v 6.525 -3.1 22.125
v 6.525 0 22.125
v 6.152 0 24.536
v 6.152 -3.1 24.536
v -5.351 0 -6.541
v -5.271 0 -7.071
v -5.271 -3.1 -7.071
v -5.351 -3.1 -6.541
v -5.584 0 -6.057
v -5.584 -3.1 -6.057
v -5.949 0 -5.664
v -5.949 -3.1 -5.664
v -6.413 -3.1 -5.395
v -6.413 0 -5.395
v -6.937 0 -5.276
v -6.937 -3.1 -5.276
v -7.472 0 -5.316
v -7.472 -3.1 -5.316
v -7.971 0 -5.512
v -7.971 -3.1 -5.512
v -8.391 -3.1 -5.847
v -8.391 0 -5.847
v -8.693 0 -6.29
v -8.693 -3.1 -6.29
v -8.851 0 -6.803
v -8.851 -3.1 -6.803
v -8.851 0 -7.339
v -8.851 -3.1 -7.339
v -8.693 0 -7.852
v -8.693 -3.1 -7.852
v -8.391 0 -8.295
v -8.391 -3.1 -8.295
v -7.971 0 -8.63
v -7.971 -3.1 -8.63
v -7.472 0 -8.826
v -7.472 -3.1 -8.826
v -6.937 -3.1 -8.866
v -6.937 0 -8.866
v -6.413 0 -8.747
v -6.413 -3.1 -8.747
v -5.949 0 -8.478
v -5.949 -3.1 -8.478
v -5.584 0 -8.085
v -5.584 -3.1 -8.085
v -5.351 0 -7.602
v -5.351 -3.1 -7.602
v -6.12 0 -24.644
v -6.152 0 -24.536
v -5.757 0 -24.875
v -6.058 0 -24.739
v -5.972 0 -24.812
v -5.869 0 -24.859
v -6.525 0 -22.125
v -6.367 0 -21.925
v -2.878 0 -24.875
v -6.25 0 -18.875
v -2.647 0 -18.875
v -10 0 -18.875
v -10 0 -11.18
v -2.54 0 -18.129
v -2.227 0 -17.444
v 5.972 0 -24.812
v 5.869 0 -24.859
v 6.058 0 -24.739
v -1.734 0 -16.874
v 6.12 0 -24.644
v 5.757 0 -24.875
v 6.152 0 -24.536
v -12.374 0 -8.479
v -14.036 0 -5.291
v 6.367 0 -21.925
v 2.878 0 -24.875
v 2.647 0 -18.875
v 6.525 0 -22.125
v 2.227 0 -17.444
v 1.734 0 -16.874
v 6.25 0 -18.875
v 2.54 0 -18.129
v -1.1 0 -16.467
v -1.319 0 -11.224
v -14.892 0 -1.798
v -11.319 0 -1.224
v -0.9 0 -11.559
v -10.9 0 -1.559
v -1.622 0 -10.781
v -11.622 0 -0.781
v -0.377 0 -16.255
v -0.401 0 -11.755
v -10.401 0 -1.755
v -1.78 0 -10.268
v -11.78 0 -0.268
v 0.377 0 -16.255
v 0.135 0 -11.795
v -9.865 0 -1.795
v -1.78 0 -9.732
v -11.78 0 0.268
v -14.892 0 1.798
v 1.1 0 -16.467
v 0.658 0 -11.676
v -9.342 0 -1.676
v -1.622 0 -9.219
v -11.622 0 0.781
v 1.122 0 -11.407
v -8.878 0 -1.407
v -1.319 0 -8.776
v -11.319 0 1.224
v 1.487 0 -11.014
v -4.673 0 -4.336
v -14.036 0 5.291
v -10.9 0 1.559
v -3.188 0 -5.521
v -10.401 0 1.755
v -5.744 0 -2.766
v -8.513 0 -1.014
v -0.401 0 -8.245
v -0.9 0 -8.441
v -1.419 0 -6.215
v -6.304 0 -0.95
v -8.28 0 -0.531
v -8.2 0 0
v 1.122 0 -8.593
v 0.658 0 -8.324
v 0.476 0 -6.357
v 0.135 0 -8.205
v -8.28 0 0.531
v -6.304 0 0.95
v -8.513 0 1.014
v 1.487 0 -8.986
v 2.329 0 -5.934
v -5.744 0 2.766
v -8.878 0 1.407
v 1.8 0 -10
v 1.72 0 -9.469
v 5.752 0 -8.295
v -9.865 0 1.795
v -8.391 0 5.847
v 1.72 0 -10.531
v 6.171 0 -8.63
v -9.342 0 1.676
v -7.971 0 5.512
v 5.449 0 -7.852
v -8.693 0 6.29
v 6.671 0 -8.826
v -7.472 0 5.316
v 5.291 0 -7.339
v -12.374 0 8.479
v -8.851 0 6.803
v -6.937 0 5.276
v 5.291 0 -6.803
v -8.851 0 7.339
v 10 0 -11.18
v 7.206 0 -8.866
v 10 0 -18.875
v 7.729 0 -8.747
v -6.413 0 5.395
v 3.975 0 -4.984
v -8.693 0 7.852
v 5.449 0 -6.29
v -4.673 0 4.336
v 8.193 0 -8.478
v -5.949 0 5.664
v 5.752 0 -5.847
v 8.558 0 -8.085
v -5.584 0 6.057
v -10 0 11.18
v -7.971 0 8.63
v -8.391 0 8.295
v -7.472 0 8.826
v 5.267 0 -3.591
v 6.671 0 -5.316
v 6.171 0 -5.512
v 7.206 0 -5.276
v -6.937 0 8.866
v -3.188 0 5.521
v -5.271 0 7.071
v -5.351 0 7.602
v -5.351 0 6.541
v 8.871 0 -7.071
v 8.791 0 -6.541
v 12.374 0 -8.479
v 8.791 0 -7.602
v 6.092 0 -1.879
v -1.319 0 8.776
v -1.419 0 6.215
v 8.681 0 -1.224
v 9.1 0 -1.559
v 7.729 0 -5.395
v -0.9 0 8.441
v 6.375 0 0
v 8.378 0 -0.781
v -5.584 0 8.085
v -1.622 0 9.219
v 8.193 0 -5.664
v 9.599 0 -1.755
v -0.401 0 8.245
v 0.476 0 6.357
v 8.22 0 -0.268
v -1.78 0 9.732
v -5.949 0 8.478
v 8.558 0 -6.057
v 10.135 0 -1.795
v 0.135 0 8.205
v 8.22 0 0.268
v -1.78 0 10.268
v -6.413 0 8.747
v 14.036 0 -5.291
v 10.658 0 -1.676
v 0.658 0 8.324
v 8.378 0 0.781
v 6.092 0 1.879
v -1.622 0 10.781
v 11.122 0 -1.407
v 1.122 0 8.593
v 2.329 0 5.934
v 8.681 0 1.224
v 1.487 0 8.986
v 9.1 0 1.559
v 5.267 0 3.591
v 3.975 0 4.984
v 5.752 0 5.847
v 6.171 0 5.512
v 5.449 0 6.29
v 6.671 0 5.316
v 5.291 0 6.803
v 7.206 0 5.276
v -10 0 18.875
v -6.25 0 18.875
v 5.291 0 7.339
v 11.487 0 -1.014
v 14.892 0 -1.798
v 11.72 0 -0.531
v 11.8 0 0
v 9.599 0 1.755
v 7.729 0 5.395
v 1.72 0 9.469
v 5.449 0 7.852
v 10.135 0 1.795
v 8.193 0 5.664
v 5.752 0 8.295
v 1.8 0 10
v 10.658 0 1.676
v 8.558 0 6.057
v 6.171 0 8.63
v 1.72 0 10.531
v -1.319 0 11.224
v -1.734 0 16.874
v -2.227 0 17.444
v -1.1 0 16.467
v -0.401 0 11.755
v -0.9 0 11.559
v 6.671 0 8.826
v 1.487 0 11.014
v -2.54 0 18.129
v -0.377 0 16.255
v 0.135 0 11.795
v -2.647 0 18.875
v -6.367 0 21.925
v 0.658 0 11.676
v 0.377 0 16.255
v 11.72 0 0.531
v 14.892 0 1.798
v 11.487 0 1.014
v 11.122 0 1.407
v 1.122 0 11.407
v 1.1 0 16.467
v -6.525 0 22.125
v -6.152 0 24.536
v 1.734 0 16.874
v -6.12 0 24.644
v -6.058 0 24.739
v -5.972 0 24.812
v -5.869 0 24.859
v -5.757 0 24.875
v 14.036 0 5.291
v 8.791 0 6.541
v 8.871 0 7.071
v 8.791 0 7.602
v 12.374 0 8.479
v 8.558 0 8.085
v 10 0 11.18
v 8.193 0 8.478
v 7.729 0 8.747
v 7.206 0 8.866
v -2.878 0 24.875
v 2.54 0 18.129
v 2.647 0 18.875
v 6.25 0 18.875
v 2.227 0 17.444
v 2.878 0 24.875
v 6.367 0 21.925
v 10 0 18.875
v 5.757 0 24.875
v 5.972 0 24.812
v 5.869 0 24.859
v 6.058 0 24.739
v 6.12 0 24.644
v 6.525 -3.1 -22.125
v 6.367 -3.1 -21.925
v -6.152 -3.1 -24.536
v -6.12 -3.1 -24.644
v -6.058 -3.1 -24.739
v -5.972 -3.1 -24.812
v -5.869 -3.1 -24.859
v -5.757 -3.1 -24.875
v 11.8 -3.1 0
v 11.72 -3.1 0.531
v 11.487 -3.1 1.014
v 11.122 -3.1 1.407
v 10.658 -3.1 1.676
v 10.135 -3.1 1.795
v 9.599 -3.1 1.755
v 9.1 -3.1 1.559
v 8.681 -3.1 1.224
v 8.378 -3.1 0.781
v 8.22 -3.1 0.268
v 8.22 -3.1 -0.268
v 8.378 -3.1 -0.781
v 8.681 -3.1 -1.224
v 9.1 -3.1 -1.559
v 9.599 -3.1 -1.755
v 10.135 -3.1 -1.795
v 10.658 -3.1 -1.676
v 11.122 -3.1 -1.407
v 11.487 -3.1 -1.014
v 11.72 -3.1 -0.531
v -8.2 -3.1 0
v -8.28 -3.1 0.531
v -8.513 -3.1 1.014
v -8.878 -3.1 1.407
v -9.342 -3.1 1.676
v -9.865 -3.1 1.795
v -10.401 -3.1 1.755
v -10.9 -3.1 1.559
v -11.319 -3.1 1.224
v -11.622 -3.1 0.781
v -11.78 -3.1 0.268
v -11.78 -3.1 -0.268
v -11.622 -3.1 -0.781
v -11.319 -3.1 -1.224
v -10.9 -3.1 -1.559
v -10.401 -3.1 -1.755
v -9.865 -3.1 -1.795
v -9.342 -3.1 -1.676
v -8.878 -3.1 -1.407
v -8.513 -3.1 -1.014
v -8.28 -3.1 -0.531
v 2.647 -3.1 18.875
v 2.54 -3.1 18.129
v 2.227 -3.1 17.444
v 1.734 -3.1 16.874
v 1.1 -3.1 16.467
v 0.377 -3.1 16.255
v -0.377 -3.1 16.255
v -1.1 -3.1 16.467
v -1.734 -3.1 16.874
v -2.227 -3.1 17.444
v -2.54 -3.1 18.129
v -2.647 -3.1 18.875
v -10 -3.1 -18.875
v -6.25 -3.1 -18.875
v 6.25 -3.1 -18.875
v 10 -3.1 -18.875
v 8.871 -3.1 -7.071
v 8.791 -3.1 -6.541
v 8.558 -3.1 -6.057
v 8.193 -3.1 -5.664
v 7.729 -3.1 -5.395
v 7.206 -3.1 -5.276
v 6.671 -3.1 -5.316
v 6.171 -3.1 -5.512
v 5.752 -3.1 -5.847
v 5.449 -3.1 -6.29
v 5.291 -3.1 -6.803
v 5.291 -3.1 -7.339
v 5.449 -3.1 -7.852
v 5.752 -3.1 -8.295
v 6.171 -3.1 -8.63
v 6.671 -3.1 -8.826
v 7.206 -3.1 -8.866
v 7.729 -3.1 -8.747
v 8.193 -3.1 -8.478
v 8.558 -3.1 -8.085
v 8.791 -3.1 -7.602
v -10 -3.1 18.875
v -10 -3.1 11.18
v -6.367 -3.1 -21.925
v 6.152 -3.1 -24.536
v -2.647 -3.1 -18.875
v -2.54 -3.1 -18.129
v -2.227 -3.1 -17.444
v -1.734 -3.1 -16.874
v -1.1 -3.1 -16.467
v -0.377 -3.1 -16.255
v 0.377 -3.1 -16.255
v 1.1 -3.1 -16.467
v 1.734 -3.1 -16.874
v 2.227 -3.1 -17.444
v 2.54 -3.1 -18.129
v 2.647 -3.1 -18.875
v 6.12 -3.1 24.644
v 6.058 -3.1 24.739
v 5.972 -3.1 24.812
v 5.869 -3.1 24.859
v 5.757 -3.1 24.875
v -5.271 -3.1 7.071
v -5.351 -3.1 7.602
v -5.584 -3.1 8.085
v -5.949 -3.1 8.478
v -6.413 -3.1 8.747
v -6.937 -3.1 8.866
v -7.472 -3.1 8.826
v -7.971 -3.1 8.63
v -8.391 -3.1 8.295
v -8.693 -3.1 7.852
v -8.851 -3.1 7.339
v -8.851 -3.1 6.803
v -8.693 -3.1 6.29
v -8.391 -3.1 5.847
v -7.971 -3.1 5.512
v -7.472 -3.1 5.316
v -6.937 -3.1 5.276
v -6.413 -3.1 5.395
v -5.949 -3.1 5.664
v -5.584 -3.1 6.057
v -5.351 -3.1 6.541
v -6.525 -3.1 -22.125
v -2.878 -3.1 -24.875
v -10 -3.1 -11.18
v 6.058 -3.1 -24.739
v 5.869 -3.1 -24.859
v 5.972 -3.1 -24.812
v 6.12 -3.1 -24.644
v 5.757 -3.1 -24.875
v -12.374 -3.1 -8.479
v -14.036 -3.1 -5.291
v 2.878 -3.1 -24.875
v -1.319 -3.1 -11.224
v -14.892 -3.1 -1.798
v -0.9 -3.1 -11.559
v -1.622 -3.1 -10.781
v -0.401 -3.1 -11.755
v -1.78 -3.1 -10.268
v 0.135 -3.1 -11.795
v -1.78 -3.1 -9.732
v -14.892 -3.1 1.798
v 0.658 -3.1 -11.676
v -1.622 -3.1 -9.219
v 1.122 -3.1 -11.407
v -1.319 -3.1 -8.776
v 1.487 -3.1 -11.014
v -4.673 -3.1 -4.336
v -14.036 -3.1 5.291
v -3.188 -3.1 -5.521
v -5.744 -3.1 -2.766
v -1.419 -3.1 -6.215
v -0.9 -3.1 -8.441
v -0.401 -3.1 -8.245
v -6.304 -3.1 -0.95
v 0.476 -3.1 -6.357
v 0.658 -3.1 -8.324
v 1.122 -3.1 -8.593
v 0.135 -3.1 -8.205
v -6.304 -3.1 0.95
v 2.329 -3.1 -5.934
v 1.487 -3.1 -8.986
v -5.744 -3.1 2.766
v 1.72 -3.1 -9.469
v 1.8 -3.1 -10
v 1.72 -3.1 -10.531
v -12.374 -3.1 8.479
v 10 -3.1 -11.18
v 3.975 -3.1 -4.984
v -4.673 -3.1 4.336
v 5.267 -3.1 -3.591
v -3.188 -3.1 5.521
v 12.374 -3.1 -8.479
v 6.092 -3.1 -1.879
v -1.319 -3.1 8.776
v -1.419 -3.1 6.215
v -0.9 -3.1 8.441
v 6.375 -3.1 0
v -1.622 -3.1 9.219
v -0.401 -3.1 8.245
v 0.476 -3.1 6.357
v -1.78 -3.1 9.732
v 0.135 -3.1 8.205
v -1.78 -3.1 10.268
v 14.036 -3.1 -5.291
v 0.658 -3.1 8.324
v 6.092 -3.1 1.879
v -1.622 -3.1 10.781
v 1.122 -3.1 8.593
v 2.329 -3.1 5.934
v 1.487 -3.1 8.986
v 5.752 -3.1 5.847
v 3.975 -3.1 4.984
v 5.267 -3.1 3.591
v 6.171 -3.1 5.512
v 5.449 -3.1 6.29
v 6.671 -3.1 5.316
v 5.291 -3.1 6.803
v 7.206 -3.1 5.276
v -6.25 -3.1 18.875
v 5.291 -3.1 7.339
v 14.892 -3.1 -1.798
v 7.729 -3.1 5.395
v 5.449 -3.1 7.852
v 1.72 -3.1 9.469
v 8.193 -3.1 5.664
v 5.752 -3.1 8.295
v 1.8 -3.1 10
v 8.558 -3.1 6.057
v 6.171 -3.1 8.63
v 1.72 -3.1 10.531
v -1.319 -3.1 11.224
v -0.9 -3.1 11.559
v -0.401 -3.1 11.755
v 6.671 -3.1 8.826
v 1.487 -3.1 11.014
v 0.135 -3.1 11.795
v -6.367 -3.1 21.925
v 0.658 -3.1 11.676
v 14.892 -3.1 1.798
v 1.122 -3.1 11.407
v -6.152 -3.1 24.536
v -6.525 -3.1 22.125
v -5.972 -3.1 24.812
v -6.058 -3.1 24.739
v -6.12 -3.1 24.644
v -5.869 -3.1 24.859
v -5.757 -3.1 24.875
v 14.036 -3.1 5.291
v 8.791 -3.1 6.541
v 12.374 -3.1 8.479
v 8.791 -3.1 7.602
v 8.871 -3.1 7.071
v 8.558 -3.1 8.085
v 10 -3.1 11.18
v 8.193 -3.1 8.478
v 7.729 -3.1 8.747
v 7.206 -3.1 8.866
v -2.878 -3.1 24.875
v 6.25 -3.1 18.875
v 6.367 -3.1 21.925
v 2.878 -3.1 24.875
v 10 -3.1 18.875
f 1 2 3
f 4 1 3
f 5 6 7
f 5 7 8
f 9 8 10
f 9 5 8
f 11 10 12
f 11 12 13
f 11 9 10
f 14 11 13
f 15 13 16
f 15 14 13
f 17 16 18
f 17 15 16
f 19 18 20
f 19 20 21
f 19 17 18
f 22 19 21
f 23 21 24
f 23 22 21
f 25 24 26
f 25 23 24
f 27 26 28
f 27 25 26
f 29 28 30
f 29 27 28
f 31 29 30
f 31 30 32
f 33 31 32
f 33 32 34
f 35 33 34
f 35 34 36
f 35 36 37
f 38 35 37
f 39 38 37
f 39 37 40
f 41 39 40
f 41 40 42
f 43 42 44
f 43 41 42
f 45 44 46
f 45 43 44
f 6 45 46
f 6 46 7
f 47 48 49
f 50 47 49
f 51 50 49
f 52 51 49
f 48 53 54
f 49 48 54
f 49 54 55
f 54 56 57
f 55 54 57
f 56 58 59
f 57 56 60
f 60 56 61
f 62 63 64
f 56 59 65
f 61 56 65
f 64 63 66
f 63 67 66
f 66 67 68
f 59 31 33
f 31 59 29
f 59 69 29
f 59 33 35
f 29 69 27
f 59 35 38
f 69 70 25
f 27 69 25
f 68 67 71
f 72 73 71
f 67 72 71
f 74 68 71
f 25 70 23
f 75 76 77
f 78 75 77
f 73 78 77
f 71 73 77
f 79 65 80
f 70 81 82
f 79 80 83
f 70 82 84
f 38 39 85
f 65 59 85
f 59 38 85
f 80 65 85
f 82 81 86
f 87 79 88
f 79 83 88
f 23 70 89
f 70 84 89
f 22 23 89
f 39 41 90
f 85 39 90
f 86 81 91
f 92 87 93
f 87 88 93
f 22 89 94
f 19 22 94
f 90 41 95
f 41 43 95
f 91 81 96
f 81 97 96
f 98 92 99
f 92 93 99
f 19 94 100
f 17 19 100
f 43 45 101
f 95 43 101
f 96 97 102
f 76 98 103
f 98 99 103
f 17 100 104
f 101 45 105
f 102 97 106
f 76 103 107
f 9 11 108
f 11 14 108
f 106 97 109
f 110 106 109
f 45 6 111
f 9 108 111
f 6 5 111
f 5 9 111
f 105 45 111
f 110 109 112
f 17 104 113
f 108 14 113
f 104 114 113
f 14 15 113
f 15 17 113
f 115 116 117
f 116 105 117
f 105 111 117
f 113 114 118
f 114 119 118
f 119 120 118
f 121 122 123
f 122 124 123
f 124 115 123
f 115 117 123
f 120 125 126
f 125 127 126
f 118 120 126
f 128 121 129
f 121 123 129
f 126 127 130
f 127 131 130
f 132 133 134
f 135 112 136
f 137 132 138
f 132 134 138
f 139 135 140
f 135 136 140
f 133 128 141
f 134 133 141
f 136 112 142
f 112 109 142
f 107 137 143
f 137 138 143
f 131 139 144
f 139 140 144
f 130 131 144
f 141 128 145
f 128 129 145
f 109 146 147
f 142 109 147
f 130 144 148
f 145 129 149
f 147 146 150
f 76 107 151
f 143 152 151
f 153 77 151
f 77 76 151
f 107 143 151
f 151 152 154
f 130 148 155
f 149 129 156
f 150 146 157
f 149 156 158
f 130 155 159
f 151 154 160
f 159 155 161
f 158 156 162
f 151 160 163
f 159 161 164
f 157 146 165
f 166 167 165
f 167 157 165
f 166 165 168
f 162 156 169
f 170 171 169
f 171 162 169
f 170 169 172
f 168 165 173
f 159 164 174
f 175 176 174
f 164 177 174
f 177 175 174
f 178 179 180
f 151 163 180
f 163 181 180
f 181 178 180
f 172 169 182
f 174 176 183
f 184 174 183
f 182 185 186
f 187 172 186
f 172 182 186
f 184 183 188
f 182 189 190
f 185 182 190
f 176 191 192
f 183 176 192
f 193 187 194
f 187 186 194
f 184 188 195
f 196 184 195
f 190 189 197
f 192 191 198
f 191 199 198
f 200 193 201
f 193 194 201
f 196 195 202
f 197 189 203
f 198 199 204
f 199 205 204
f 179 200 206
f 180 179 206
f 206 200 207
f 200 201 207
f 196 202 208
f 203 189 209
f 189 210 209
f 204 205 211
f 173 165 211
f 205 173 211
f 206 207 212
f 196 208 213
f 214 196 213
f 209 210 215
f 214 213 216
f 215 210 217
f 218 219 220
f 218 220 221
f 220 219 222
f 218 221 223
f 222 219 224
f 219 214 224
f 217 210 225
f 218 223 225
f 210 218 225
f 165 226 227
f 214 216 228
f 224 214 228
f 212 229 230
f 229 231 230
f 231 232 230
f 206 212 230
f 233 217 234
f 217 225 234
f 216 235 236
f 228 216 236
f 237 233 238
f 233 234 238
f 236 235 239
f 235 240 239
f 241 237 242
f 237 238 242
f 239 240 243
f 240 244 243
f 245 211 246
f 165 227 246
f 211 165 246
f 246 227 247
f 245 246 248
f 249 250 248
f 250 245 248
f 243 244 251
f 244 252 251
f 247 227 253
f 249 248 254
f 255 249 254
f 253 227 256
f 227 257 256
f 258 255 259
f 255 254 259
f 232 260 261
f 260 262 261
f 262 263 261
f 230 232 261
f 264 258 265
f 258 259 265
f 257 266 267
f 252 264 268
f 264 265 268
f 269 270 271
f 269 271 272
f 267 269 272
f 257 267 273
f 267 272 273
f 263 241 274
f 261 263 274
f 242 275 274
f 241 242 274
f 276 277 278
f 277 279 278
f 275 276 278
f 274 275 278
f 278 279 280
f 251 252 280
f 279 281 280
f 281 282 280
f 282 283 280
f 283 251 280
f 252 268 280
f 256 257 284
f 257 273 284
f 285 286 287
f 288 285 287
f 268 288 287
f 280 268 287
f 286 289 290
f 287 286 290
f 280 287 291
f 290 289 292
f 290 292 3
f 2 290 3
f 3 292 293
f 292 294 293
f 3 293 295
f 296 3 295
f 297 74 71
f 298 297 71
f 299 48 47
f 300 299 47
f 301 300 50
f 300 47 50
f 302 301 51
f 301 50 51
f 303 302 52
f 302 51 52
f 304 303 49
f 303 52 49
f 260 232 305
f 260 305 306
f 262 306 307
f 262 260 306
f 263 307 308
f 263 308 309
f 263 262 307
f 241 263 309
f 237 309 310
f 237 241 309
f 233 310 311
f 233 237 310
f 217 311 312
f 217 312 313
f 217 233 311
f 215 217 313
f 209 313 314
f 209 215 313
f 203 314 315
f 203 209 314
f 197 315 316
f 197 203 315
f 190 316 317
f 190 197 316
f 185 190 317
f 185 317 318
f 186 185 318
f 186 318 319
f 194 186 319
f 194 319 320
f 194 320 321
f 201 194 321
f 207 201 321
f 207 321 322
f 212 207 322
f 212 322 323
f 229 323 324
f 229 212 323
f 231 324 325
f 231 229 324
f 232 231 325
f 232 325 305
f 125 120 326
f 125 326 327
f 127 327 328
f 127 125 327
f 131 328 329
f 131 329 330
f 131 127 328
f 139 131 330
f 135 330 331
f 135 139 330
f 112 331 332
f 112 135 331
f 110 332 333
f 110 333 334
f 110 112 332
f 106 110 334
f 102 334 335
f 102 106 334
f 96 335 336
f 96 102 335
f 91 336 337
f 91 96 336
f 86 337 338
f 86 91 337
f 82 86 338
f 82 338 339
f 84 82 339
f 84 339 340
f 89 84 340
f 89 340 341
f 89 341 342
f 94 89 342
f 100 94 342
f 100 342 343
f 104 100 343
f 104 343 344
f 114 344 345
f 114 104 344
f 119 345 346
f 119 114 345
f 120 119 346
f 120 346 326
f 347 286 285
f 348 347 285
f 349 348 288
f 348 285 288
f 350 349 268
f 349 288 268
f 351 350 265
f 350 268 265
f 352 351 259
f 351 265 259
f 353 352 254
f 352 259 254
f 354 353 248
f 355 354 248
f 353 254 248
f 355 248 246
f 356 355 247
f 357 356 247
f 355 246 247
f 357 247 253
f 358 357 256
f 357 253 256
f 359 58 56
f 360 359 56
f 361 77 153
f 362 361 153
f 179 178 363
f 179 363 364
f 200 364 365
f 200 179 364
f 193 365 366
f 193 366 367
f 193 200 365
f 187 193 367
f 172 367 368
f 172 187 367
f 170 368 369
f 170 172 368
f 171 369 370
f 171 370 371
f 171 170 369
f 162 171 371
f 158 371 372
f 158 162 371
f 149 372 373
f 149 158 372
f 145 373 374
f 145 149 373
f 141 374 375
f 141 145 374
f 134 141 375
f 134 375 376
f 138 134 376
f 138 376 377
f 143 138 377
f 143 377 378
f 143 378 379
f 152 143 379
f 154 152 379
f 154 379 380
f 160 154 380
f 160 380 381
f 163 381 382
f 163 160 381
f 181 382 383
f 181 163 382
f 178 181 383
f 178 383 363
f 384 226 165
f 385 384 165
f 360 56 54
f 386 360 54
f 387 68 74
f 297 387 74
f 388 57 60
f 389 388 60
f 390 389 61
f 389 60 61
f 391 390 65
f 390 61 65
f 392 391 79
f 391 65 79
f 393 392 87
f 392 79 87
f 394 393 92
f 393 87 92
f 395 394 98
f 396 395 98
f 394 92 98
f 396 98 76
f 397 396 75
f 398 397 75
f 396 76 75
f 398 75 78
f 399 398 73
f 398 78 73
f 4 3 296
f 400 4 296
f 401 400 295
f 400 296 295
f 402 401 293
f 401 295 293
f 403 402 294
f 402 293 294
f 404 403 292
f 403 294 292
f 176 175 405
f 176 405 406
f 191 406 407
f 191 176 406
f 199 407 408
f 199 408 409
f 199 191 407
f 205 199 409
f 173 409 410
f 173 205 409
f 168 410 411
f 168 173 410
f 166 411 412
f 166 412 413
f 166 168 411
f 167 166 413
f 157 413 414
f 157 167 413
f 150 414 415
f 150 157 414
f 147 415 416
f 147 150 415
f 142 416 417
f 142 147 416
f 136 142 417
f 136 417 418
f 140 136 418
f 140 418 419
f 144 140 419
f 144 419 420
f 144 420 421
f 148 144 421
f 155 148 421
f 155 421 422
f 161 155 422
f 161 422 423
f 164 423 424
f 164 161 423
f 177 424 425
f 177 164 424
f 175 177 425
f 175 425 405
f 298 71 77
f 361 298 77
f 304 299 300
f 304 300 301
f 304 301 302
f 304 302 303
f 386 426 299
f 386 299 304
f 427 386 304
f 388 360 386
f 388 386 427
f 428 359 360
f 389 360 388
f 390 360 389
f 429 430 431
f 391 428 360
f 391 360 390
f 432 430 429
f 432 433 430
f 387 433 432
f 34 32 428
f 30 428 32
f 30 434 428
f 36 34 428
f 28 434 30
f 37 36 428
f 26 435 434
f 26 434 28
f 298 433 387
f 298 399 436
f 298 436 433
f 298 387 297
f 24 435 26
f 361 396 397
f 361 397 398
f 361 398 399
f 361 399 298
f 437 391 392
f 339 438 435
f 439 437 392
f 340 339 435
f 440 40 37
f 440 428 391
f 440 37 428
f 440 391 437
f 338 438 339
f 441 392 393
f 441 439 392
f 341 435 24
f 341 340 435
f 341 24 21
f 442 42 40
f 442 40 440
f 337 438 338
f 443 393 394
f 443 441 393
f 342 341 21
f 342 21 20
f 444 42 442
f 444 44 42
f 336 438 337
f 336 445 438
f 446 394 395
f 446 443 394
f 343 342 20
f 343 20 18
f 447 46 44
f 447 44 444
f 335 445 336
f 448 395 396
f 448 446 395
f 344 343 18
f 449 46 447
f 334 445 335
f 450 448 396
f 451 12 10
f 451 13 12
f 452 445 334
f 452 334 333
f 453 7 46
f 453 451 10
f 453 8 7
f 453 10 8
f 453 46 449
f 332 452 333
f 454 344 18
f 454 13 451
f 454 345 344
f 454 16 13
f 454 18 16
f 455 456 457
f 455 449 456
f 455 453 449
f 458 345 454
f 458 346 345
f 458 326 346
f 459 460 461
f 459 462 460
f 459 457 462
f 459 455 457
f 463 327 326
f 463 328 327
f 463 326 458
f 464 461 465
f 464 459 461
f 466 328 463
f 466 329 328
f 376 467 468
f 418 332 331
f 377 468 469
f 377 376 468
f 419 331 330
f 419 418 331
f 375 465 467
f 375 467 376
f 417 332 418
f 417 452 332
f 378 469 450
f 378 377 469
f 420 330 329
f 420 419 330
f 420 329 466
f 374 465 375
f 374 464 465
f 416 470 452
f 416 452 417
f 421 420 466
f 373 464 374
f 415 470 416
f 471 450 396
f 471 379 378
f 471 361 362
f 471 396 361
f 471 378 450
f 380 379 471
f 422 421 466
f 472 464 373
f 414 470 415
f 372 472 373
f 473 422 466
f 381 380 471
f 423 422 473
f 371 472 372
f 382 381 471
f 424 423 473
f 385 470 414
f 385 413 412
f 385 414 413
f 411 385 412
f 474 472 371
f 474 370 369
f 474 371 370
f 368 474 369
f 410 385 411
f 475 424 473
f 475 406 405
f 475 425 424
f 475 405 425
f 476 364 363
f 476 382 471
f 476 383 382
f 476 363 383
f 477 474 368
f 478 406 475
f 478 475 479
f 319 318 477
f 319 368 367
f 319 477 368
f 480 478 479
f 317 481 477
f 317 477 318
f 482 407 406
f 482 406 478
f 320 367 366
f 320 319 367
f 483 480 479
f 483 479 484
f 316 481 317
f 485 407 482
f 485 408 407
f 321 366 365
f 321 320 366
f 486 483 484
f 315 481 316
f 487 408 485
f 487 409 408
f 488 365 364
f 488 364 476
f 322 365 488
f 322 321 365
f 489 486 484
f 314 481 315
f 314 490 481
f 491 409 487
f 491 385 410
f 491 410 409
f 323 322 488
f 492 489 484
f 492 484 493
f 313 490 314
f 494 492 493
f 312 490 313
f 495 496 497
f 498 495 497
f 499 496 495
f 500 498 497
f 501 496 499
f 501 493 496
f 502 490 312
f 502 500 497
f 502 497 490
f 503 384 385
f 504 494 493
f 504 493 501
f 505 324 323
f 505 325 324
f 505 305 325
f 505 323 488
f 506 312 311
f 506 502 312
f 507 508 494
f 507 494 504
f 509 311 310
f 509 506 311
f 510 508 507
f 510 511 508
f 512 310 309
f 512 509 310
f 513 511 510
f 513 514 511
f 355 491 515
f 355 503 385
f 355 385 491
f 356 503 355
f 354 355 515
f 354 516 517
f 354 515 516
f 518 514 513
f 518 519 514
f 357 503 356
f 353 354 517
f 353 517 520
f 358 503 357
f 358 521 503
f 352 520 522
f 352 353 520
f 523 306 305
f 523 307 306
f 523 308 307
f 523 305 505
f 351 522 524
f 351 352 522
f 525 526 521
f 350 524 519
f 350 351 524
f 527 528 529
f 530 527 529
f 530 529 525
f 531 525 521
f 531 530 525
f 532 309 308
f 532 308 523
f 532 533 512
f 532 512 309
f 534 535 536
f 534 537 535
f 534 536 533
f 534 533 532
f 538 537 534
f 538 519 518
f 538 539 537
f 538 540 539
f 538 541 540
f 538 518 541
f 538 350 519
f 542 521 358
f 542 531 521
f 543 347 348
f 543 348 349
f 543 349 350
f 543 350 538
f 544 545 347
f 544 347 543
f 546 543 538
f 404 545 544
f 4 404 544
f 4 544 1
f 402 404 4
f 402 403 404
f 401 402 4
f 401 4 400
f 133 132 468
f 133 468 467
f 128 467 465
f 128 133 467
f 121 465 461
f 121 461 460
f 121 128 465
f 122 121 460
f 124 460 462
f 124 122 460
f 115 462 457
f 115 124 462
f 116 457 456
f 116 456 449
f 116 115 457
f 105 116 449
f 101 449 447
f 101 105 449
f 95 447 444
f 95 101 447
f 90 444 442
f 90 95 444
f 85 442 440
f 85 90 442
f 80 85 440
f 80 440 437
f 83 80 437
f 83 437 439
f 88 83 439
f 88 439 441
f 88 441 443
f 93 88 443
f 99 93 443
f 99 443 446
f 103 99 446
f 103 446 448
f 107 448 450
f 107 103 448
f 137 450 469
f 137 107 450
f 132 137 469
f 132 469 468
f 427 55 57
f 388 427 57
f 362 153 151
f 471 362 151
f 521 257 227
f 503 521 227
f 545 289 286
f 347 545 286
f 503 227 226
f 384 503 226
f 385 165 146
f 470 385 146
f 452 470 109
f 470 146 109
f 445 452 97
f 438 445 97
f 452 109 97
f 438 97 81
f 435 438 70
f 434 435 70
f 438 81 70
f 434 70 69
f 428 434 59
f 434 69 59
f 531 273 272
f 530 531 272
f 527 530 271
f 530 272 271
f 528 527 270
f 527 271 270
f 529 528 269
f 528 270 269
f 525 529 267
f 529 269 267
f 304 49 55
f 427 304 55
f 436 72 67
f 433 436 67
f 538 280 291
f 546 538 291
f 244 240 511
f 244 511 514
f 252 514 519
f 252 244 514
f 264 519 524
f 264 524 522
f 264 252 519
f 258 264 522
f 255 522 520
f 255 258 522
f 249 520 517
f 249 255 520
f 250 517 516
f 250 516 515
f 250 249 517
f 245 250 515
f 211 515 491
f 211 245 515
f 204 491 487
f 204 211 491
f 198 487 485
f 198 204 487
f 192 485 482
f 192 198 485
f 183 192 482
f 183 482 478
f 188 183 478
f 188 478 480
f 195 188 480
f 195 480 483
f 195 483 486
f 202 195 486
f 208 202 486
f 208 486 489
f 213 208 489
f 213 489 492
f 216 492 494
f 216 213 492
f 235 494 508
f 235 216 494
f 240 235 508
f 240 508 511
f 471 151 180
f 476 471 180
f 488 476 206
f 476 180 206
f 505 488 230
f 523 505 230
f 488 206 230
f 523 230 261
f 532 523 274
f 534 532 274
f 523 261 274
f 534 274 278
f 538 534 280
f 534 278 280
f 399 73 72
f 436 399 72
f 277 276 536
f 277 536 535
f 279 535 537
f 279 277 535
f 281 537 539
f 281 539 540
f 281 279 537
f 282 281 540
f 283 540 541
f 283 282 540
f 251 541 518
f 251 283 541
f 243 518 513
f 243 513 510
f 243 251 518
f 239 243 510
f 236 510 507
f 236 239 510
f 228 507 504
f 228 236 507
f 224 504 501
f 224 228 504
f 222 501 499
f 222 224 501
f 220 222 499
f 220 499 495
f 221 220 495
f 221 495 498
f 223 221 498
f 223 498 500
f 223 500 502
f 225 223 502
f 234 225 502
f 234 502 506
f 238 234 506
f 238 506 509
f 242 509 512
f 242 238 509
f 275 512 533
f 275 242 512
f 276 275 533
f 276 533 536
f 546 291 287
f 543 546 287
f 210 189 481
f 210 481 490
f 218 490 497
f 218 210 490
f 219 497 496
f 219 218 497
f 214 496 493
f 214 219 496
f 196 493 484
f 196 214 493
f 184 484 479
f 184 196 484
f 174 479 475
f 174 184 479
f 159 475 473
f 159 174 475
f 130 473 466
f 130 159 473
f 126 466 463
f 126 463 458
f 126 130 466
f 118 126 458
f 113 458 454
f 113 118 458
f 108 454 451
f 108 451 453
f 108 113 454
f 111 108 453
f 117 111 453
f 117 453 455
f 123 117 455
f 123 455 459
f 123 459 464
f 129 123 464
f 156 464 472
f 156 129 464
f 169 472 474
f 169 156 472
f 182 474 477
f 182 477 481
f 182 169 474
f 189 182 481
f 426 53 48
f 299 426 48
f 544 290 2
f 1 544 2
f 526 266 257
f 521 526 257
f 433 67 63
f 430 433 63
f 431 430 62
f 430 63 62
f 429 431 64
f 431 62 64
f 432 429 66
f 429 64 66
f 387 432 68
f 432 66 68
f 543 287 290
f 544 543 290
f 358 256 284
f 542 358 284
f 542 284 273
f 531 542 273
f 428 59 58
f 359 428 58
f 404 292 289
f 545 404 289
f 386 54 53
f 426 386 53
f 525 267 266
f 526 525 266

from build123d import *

# Parameters (mm, degrees)
F0_R     = 1.8
F0_R_2   = 6.375
F1_DEPTH = 3.1


with BuildPart() as f1:
    # F0 (on Front) → F1 (new body)
    with BuildSketch(Plane.XZ):
        with BuildLine():
            Line((-10, 18.875), (-10, 11.18034))
            ThreePointArc((-10, 11.18034), (-15, 0), (-10, -11.18034))
            Line((-10, -11.18034), (-10, -18.875))
            Line((-10, -18.875), (-6.25, -18.875))
            Line((-6.25, -18.875), (-6.367204, -21.925))
            Line((-6.367204, -21.925), (-6.525, -22.125))
            Line((-6.525, -22.125), (-6.152377, -24.536093))
            ThreePointArc((-6.152377, -24.536093), (-6.017418, -24.778675), (-5.75707, -24.875))
            Line((-5.75707, -24.875), (-2.877908, -24.875))
            Line((-2.877908, -24.875), (-2.647343, -18.875))
            ThreePointArc((-2.647343, -18.875), (0, -16.227657), (2.647343, -18.875))
            Line((2.647343, -18.875), (2.877908, -24.875))
            Line((2.877908, -24.875), (5.75707, -24.875))
            ThreePointArc((5.75707, -24.875), (6.017418, -24.778675), (6.152377, -24.536093))
            Line((6.152377, -24.536093), (6.525, -22.125))
            Line((6.525, -22.125), (6.367204, -21.925))
            Line((6.367204, -21.925), (6.25, -18.875))
            Line((6.25, -18.875), (10, -18.875))
            Line((10, -18.875), (10, -11.18034))
            ThreePointArc((10, -11.18034), (15, 0), (10, 11.18034))
            Line((10, 11.18034), (10, 18.875))
            Line((10, 18.875), (6.25, 18.875))
            Line((6.25, 18.875), (6.367204, 21.925))
            Line((6.367204, 21.925), (6.525, 22.125))
            Line((6.525, 22.125), (6.152377, 24.536093))
            ThreePointArc((6.152377, 24.536093), (6.017418, 24.778675), (5.75707, 24.875))
            Line((5.75707, 24.875), (2.877908, 24.875))
            Line((2.877908, 24.875), (2.647343, 18.875))
            ThreePointArc((2.647343, 18.875), (0, 16.227657), (-2.647343, 18.875))
            Line((-2.647343, 18.875), (-2.877908, 24.875))
            Line((-2.877908, 24.875), (-5.75707, 24.875))
            ThreePointArc((-5.75707, 24.875), (-6.017418, 24.778675), (-6.152377, 24.536093))
            Line((-6.152377, 24.536093), (-6.525, 22.125))
            Line((-6.525, 22.125), (-6.367204, 21.925))
            Line((-6.367204, 21.925), (-6.25, 18.875))
            Line((-6.25, 18.875), (-10, 18.875))
        make_face()
        with Locations((-7.071068, -7.071068)):
            Circle(F0_R, mode=Mode.SUBTRACT)
        with Locations((0, -10)):
            Circle(F0_R, mode=Mode.SUBTRACT)
        with Locations((7.071068, -7.071068)):
            Circle(F0_R, mode=Mode.SUBTRACT)
        with Locations((-10, 0)):
            Circle(F0_R, mode=Mode.SUBTRACT)
        with Locations((-7.071068, 7.071068)):
            Circle(F0_R, mode=Mode.SUBTRACT)
        Circle(F0_R_2, mode=Mode.SUBTRACT)
        with Locations((0, 10)):
            Circle(F0_R, mode=Mode.SUBTRACT)
        with Locations((7.071068, 7.071068)):
            Circle(F0_R, mode=Mode.SUBTRACT)
        with Locations((10, 0)):
            Circle(F0_R, mode=Mode.SUBTRACT)
    extrude(amount=F1_DEPTH)


solid = f1.part
